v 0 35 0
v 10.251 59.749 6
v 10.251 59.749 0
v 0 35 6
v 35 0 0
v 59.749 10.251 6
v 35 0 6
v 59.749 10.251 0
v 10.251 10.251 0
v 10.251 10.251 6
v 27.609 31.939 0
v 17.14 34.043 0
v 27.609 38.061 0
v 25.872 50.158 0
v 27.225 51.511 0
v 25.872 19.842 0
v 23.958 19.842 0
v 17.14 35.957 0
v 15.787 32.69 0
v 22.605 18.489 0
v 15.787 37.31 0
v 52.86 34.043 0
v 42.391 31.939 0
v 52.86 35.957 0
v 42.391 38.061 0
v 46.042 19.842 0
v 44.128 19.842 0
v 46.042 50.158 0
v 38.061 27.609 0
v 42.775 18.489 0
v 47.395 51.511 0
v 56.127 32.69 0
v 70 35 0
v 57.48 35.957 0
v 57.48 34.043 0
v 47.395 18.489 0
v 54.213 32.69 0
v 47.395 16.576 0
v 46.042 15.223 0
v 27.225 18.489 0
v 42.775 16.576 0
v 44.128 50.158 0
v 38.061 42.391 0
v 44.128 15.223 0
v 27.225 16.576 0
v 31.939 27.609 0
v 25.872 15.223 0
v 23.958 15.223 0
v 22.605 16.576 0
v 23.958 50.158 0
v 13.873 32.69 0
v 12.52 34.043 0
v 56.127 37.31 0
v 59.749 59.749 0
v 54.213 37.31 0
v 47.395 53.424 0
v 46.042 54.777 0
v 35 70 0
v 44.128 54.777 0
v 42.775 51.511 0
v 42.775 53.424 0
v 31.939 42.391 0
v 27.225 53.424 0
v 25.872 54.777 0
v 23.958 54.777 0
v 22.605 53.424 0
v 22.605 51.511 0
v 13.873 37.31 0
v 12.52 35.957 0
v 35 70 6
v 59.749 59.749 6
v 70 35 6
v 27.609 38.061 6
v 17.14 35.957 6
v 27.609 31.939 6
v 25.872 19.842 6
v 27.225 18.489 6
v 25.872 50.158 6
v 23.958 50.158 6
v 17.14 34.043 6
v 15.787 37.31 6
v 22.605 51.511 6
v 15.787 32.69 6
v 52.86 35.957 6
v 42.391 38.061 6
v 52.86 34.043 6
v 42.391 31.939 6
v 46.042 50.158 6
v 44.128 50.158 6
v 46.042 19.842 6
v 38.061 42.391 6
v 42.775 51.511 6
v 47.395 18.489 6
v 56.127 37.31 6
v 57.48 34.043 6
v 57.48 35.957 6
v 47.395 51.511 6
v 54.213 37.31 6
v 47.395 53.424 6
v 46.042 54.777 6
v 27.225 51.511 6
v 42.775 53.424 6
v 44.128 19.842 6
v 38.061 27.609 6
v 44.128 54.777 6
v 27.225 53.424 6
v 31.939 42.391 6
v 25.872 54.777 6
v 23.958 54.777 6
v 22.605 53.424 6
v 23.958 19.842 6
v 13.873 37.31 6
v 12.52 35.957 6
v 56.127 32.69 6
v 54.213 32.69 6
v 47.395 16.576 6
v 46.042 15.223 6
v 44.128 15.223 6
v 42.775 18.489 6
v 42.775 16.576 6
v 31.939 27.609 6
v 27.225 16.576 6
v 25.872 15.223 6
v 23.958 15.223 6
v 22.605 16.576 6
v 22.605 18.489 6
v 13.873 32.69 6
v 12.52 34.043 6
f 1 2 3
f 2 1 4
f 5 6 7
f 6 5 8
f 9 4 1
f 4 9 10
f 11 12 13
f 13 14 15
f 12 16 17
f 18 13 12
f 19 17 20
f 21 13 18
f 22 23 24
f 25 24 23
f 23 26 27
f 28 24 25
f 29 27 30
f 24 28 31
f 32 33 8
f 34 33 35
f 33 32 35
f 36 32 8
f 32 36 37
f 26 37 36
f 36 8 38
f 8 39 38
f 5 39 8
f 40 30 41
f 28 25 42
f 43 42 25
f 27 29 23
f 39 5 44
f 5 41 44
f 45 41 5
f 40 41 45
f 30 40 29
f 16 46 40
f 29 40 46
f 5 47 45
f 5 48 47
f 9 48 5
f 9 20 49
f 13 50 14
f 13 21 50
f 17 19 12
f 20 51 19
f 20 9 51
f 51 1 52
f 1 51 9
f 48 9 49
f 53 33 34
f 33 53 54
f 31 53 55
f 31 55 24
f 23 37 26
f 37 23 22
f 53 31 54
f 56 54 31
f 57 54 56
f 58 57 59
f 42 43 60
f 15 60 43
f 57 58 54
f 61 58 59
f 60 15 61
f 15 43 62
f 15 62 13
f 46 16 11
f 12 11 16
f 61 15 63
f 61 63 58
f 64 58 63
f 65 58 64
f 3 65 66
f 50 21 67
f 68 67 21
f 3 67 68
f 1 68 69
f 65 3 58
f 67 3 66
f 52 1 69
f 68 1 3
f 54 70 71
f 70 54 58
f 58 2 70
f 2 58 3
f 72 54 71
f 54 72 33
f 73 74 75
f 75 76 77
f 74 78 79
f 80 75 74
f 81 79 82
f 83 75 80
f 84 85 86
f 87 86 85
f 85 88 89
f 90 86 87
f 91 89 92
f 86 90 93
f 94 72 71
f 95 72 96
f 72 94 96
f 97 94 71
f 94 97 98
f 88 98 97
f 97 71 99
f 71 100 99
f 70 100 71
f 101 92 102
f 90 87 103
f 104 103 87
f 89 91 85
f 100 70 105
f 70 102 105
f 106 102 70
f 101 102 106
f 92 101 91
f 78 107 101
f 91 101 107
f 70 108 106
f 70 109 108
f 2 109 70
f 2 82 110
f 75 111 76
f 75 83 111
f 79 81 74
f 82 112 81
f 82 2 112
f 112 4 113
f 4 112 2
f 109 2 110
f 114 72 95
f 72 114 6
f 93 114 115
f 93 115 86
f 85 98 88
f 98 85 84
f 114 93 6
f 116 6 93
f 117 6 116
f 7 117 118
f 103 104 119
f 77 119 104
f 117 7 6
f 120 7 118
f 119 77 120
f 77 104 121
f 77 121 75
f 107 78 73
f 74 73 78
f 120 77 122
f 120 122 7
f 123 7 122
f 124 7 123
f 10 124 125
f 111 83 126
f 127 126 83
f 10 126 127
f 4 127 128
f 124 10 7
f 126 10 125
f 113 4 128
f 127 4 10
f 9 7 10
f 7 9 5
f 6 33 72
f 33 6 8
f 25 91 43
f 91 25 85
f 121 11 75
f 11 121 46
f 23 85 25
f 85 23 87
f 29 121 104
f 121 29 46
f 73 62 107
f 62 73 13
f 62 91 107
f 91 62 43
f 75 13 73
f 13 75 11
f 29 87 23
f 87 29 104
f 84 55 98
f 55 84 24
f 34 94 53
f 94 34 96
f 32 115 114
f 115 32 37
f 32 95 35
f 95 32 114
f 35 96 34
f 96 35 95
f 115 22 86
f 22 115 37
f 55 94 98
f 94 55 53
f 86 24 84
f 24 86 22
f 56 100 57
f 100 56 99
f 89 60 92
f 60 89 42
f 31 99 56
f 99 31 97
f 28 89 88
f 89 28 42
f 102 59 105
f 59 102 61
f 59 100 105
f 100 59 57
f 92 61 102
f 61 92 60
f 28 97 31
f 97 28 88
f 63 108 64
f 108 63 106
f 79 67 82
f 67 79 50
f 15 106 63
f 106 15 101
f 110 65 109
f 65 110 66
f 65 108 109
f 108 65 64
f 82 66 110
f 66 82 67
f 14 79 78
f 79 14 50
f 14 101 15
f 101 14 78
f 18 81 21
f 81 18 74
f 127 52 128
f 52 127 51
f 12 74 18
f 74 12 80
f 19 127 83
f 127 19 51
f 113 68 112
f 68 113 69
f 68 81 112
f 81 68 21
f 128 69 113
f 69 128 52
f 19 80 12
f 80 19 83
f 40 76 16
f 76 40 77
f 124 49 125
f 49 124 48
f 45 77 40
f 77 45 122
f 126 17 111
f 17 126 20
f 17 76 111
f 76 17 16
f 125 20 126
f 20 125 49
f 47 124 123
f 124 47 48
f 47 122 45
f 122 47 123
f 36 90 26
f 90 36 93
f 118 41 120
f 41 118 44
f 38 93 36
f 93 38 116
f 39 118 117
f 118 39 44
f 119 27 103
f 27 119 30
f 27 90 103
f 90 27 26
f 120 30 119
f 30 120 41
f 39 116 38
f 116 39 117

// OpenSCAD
$fn = 32;

// ----------------------------------------------------------------------
// Polygon plate: 8-gon R35, 6 bolt windows
// ----------------------------------------------------------------------

// --- parameters (mm) ---
sides = 8;                // number of polygon sides
plate_r = 35;             // circumscribed radius of the polygon
bore_r = 8;               // centre bore radius
bolts = 6;                // number of bolt windows
ring_r = 20.17;           // bolt-circle radius
bolt_r = 2.5;             // bolt window radius
plate_t = 6;              // plate thickness, Z (extrusion height)

plate_d = 2 * plate_r;  // circumscribed diameter
bore_d = 2 * bore_r;  // centre bore diameter
bolt_d = 2 * bolt_r;  // bolt window diameter
ring_d = 2 * ring_r;  // bolt-circle diameter

profile = [[70, 35], [59.749, 59.749], [35, 70], [10.251, 59.749], [0, 35], [10.251, 10.251], [35, 0], [59.749, 10.251]];  // primary outline, 8 points, counter clockwise
void_1 = [[42.391, 38.061], [38.061, 42.391], [31.939, 42.391], [27.609, 38.061], [27.609, 31.939], [31.939, 27.609], [38.061, 27.609], [42.391, 31.939]];  // centre bore, 8 points
void_2 = [[57.48, 35.957], [56.127, 37.31], [54.213, 37.31], [52.86, 35.957], [52.86, 34.043], [54.213, 32.69], [56.127, 32.69], [57.48, 34.043]];  // bolt window 1, 8 points
void_3 = [[47.395, 53.424], [46.042, 54.777], [44.128, 54.777], [42.775, 53.424], [42.775, 51.511], [44.128, 50.158], [46.042, 50.158], [47.395, 51.511]];  // bolt window 2, 8 points
void_4 = [[27.225, 53.424], [25.872, 54.777], [23.958, 54.777], [22.605, 53.424], [22.605, 51.511], [23.958, 50.158], [25.872, 50.158], [27.225, 51.511]];  // bolt window 3, 8 points
void_5 = [[17.14, 35.957], [15.787, 37.31], [13.873, 37.31], [12.52, 35.957], [12.52, 34.043], [13.873, 32.69], [15.787, 32.69], [17.14, 34.043]];  // bolt window 4, 8 points
void_6 = [[27.225, 18.489], [25.872, 19.842], [23.958, 19.842], [22.605, 18.489], [22.605, 16.576], [23.958, 15.223], [25.872, 15.223], [27.225, 16.576]];  // bolt window 5, 8 points
void_7 = [[47.395, 18.489], [46.042, 19.842], [44.128, 19.842], [42.775, 18.489], [42.775, 16.576], [44.128, 15.223], [46.042, 15.223], [47.395, 16.576]];  // bolt window 6, 8 points

// --- the one profile operation ---
difference() {
  linear_extrude(height = plate_t) polygon(points = profile);
  translate([0, 0, -1])
    linear_extrude(height = plate_t + 2) polygon(points = void_1);
  translate([0, 0, -1])
    linear_extrude(height = plate_t + 2) polygon(points = void_2);
  translate([0, 0, -1])
    linear_extrude(height = plate_t + 2) polygon(points = void_3);
  translate([0, 0, -1])
    linear_extrude(height = plate_t + 2) polygon(points = void_4);
  translate([0, 0, -1])
    linear_extrude(height = plate_t + 2) polygon(points = void_5);
  translate([0, 0, -1])
    linear_extrude(height = plate_t + 2) polygon(points = void_6);
  translate([0, 0, -1])
    linear_extrude(height = plate_t + 2) polygon(points = void_7);
}
